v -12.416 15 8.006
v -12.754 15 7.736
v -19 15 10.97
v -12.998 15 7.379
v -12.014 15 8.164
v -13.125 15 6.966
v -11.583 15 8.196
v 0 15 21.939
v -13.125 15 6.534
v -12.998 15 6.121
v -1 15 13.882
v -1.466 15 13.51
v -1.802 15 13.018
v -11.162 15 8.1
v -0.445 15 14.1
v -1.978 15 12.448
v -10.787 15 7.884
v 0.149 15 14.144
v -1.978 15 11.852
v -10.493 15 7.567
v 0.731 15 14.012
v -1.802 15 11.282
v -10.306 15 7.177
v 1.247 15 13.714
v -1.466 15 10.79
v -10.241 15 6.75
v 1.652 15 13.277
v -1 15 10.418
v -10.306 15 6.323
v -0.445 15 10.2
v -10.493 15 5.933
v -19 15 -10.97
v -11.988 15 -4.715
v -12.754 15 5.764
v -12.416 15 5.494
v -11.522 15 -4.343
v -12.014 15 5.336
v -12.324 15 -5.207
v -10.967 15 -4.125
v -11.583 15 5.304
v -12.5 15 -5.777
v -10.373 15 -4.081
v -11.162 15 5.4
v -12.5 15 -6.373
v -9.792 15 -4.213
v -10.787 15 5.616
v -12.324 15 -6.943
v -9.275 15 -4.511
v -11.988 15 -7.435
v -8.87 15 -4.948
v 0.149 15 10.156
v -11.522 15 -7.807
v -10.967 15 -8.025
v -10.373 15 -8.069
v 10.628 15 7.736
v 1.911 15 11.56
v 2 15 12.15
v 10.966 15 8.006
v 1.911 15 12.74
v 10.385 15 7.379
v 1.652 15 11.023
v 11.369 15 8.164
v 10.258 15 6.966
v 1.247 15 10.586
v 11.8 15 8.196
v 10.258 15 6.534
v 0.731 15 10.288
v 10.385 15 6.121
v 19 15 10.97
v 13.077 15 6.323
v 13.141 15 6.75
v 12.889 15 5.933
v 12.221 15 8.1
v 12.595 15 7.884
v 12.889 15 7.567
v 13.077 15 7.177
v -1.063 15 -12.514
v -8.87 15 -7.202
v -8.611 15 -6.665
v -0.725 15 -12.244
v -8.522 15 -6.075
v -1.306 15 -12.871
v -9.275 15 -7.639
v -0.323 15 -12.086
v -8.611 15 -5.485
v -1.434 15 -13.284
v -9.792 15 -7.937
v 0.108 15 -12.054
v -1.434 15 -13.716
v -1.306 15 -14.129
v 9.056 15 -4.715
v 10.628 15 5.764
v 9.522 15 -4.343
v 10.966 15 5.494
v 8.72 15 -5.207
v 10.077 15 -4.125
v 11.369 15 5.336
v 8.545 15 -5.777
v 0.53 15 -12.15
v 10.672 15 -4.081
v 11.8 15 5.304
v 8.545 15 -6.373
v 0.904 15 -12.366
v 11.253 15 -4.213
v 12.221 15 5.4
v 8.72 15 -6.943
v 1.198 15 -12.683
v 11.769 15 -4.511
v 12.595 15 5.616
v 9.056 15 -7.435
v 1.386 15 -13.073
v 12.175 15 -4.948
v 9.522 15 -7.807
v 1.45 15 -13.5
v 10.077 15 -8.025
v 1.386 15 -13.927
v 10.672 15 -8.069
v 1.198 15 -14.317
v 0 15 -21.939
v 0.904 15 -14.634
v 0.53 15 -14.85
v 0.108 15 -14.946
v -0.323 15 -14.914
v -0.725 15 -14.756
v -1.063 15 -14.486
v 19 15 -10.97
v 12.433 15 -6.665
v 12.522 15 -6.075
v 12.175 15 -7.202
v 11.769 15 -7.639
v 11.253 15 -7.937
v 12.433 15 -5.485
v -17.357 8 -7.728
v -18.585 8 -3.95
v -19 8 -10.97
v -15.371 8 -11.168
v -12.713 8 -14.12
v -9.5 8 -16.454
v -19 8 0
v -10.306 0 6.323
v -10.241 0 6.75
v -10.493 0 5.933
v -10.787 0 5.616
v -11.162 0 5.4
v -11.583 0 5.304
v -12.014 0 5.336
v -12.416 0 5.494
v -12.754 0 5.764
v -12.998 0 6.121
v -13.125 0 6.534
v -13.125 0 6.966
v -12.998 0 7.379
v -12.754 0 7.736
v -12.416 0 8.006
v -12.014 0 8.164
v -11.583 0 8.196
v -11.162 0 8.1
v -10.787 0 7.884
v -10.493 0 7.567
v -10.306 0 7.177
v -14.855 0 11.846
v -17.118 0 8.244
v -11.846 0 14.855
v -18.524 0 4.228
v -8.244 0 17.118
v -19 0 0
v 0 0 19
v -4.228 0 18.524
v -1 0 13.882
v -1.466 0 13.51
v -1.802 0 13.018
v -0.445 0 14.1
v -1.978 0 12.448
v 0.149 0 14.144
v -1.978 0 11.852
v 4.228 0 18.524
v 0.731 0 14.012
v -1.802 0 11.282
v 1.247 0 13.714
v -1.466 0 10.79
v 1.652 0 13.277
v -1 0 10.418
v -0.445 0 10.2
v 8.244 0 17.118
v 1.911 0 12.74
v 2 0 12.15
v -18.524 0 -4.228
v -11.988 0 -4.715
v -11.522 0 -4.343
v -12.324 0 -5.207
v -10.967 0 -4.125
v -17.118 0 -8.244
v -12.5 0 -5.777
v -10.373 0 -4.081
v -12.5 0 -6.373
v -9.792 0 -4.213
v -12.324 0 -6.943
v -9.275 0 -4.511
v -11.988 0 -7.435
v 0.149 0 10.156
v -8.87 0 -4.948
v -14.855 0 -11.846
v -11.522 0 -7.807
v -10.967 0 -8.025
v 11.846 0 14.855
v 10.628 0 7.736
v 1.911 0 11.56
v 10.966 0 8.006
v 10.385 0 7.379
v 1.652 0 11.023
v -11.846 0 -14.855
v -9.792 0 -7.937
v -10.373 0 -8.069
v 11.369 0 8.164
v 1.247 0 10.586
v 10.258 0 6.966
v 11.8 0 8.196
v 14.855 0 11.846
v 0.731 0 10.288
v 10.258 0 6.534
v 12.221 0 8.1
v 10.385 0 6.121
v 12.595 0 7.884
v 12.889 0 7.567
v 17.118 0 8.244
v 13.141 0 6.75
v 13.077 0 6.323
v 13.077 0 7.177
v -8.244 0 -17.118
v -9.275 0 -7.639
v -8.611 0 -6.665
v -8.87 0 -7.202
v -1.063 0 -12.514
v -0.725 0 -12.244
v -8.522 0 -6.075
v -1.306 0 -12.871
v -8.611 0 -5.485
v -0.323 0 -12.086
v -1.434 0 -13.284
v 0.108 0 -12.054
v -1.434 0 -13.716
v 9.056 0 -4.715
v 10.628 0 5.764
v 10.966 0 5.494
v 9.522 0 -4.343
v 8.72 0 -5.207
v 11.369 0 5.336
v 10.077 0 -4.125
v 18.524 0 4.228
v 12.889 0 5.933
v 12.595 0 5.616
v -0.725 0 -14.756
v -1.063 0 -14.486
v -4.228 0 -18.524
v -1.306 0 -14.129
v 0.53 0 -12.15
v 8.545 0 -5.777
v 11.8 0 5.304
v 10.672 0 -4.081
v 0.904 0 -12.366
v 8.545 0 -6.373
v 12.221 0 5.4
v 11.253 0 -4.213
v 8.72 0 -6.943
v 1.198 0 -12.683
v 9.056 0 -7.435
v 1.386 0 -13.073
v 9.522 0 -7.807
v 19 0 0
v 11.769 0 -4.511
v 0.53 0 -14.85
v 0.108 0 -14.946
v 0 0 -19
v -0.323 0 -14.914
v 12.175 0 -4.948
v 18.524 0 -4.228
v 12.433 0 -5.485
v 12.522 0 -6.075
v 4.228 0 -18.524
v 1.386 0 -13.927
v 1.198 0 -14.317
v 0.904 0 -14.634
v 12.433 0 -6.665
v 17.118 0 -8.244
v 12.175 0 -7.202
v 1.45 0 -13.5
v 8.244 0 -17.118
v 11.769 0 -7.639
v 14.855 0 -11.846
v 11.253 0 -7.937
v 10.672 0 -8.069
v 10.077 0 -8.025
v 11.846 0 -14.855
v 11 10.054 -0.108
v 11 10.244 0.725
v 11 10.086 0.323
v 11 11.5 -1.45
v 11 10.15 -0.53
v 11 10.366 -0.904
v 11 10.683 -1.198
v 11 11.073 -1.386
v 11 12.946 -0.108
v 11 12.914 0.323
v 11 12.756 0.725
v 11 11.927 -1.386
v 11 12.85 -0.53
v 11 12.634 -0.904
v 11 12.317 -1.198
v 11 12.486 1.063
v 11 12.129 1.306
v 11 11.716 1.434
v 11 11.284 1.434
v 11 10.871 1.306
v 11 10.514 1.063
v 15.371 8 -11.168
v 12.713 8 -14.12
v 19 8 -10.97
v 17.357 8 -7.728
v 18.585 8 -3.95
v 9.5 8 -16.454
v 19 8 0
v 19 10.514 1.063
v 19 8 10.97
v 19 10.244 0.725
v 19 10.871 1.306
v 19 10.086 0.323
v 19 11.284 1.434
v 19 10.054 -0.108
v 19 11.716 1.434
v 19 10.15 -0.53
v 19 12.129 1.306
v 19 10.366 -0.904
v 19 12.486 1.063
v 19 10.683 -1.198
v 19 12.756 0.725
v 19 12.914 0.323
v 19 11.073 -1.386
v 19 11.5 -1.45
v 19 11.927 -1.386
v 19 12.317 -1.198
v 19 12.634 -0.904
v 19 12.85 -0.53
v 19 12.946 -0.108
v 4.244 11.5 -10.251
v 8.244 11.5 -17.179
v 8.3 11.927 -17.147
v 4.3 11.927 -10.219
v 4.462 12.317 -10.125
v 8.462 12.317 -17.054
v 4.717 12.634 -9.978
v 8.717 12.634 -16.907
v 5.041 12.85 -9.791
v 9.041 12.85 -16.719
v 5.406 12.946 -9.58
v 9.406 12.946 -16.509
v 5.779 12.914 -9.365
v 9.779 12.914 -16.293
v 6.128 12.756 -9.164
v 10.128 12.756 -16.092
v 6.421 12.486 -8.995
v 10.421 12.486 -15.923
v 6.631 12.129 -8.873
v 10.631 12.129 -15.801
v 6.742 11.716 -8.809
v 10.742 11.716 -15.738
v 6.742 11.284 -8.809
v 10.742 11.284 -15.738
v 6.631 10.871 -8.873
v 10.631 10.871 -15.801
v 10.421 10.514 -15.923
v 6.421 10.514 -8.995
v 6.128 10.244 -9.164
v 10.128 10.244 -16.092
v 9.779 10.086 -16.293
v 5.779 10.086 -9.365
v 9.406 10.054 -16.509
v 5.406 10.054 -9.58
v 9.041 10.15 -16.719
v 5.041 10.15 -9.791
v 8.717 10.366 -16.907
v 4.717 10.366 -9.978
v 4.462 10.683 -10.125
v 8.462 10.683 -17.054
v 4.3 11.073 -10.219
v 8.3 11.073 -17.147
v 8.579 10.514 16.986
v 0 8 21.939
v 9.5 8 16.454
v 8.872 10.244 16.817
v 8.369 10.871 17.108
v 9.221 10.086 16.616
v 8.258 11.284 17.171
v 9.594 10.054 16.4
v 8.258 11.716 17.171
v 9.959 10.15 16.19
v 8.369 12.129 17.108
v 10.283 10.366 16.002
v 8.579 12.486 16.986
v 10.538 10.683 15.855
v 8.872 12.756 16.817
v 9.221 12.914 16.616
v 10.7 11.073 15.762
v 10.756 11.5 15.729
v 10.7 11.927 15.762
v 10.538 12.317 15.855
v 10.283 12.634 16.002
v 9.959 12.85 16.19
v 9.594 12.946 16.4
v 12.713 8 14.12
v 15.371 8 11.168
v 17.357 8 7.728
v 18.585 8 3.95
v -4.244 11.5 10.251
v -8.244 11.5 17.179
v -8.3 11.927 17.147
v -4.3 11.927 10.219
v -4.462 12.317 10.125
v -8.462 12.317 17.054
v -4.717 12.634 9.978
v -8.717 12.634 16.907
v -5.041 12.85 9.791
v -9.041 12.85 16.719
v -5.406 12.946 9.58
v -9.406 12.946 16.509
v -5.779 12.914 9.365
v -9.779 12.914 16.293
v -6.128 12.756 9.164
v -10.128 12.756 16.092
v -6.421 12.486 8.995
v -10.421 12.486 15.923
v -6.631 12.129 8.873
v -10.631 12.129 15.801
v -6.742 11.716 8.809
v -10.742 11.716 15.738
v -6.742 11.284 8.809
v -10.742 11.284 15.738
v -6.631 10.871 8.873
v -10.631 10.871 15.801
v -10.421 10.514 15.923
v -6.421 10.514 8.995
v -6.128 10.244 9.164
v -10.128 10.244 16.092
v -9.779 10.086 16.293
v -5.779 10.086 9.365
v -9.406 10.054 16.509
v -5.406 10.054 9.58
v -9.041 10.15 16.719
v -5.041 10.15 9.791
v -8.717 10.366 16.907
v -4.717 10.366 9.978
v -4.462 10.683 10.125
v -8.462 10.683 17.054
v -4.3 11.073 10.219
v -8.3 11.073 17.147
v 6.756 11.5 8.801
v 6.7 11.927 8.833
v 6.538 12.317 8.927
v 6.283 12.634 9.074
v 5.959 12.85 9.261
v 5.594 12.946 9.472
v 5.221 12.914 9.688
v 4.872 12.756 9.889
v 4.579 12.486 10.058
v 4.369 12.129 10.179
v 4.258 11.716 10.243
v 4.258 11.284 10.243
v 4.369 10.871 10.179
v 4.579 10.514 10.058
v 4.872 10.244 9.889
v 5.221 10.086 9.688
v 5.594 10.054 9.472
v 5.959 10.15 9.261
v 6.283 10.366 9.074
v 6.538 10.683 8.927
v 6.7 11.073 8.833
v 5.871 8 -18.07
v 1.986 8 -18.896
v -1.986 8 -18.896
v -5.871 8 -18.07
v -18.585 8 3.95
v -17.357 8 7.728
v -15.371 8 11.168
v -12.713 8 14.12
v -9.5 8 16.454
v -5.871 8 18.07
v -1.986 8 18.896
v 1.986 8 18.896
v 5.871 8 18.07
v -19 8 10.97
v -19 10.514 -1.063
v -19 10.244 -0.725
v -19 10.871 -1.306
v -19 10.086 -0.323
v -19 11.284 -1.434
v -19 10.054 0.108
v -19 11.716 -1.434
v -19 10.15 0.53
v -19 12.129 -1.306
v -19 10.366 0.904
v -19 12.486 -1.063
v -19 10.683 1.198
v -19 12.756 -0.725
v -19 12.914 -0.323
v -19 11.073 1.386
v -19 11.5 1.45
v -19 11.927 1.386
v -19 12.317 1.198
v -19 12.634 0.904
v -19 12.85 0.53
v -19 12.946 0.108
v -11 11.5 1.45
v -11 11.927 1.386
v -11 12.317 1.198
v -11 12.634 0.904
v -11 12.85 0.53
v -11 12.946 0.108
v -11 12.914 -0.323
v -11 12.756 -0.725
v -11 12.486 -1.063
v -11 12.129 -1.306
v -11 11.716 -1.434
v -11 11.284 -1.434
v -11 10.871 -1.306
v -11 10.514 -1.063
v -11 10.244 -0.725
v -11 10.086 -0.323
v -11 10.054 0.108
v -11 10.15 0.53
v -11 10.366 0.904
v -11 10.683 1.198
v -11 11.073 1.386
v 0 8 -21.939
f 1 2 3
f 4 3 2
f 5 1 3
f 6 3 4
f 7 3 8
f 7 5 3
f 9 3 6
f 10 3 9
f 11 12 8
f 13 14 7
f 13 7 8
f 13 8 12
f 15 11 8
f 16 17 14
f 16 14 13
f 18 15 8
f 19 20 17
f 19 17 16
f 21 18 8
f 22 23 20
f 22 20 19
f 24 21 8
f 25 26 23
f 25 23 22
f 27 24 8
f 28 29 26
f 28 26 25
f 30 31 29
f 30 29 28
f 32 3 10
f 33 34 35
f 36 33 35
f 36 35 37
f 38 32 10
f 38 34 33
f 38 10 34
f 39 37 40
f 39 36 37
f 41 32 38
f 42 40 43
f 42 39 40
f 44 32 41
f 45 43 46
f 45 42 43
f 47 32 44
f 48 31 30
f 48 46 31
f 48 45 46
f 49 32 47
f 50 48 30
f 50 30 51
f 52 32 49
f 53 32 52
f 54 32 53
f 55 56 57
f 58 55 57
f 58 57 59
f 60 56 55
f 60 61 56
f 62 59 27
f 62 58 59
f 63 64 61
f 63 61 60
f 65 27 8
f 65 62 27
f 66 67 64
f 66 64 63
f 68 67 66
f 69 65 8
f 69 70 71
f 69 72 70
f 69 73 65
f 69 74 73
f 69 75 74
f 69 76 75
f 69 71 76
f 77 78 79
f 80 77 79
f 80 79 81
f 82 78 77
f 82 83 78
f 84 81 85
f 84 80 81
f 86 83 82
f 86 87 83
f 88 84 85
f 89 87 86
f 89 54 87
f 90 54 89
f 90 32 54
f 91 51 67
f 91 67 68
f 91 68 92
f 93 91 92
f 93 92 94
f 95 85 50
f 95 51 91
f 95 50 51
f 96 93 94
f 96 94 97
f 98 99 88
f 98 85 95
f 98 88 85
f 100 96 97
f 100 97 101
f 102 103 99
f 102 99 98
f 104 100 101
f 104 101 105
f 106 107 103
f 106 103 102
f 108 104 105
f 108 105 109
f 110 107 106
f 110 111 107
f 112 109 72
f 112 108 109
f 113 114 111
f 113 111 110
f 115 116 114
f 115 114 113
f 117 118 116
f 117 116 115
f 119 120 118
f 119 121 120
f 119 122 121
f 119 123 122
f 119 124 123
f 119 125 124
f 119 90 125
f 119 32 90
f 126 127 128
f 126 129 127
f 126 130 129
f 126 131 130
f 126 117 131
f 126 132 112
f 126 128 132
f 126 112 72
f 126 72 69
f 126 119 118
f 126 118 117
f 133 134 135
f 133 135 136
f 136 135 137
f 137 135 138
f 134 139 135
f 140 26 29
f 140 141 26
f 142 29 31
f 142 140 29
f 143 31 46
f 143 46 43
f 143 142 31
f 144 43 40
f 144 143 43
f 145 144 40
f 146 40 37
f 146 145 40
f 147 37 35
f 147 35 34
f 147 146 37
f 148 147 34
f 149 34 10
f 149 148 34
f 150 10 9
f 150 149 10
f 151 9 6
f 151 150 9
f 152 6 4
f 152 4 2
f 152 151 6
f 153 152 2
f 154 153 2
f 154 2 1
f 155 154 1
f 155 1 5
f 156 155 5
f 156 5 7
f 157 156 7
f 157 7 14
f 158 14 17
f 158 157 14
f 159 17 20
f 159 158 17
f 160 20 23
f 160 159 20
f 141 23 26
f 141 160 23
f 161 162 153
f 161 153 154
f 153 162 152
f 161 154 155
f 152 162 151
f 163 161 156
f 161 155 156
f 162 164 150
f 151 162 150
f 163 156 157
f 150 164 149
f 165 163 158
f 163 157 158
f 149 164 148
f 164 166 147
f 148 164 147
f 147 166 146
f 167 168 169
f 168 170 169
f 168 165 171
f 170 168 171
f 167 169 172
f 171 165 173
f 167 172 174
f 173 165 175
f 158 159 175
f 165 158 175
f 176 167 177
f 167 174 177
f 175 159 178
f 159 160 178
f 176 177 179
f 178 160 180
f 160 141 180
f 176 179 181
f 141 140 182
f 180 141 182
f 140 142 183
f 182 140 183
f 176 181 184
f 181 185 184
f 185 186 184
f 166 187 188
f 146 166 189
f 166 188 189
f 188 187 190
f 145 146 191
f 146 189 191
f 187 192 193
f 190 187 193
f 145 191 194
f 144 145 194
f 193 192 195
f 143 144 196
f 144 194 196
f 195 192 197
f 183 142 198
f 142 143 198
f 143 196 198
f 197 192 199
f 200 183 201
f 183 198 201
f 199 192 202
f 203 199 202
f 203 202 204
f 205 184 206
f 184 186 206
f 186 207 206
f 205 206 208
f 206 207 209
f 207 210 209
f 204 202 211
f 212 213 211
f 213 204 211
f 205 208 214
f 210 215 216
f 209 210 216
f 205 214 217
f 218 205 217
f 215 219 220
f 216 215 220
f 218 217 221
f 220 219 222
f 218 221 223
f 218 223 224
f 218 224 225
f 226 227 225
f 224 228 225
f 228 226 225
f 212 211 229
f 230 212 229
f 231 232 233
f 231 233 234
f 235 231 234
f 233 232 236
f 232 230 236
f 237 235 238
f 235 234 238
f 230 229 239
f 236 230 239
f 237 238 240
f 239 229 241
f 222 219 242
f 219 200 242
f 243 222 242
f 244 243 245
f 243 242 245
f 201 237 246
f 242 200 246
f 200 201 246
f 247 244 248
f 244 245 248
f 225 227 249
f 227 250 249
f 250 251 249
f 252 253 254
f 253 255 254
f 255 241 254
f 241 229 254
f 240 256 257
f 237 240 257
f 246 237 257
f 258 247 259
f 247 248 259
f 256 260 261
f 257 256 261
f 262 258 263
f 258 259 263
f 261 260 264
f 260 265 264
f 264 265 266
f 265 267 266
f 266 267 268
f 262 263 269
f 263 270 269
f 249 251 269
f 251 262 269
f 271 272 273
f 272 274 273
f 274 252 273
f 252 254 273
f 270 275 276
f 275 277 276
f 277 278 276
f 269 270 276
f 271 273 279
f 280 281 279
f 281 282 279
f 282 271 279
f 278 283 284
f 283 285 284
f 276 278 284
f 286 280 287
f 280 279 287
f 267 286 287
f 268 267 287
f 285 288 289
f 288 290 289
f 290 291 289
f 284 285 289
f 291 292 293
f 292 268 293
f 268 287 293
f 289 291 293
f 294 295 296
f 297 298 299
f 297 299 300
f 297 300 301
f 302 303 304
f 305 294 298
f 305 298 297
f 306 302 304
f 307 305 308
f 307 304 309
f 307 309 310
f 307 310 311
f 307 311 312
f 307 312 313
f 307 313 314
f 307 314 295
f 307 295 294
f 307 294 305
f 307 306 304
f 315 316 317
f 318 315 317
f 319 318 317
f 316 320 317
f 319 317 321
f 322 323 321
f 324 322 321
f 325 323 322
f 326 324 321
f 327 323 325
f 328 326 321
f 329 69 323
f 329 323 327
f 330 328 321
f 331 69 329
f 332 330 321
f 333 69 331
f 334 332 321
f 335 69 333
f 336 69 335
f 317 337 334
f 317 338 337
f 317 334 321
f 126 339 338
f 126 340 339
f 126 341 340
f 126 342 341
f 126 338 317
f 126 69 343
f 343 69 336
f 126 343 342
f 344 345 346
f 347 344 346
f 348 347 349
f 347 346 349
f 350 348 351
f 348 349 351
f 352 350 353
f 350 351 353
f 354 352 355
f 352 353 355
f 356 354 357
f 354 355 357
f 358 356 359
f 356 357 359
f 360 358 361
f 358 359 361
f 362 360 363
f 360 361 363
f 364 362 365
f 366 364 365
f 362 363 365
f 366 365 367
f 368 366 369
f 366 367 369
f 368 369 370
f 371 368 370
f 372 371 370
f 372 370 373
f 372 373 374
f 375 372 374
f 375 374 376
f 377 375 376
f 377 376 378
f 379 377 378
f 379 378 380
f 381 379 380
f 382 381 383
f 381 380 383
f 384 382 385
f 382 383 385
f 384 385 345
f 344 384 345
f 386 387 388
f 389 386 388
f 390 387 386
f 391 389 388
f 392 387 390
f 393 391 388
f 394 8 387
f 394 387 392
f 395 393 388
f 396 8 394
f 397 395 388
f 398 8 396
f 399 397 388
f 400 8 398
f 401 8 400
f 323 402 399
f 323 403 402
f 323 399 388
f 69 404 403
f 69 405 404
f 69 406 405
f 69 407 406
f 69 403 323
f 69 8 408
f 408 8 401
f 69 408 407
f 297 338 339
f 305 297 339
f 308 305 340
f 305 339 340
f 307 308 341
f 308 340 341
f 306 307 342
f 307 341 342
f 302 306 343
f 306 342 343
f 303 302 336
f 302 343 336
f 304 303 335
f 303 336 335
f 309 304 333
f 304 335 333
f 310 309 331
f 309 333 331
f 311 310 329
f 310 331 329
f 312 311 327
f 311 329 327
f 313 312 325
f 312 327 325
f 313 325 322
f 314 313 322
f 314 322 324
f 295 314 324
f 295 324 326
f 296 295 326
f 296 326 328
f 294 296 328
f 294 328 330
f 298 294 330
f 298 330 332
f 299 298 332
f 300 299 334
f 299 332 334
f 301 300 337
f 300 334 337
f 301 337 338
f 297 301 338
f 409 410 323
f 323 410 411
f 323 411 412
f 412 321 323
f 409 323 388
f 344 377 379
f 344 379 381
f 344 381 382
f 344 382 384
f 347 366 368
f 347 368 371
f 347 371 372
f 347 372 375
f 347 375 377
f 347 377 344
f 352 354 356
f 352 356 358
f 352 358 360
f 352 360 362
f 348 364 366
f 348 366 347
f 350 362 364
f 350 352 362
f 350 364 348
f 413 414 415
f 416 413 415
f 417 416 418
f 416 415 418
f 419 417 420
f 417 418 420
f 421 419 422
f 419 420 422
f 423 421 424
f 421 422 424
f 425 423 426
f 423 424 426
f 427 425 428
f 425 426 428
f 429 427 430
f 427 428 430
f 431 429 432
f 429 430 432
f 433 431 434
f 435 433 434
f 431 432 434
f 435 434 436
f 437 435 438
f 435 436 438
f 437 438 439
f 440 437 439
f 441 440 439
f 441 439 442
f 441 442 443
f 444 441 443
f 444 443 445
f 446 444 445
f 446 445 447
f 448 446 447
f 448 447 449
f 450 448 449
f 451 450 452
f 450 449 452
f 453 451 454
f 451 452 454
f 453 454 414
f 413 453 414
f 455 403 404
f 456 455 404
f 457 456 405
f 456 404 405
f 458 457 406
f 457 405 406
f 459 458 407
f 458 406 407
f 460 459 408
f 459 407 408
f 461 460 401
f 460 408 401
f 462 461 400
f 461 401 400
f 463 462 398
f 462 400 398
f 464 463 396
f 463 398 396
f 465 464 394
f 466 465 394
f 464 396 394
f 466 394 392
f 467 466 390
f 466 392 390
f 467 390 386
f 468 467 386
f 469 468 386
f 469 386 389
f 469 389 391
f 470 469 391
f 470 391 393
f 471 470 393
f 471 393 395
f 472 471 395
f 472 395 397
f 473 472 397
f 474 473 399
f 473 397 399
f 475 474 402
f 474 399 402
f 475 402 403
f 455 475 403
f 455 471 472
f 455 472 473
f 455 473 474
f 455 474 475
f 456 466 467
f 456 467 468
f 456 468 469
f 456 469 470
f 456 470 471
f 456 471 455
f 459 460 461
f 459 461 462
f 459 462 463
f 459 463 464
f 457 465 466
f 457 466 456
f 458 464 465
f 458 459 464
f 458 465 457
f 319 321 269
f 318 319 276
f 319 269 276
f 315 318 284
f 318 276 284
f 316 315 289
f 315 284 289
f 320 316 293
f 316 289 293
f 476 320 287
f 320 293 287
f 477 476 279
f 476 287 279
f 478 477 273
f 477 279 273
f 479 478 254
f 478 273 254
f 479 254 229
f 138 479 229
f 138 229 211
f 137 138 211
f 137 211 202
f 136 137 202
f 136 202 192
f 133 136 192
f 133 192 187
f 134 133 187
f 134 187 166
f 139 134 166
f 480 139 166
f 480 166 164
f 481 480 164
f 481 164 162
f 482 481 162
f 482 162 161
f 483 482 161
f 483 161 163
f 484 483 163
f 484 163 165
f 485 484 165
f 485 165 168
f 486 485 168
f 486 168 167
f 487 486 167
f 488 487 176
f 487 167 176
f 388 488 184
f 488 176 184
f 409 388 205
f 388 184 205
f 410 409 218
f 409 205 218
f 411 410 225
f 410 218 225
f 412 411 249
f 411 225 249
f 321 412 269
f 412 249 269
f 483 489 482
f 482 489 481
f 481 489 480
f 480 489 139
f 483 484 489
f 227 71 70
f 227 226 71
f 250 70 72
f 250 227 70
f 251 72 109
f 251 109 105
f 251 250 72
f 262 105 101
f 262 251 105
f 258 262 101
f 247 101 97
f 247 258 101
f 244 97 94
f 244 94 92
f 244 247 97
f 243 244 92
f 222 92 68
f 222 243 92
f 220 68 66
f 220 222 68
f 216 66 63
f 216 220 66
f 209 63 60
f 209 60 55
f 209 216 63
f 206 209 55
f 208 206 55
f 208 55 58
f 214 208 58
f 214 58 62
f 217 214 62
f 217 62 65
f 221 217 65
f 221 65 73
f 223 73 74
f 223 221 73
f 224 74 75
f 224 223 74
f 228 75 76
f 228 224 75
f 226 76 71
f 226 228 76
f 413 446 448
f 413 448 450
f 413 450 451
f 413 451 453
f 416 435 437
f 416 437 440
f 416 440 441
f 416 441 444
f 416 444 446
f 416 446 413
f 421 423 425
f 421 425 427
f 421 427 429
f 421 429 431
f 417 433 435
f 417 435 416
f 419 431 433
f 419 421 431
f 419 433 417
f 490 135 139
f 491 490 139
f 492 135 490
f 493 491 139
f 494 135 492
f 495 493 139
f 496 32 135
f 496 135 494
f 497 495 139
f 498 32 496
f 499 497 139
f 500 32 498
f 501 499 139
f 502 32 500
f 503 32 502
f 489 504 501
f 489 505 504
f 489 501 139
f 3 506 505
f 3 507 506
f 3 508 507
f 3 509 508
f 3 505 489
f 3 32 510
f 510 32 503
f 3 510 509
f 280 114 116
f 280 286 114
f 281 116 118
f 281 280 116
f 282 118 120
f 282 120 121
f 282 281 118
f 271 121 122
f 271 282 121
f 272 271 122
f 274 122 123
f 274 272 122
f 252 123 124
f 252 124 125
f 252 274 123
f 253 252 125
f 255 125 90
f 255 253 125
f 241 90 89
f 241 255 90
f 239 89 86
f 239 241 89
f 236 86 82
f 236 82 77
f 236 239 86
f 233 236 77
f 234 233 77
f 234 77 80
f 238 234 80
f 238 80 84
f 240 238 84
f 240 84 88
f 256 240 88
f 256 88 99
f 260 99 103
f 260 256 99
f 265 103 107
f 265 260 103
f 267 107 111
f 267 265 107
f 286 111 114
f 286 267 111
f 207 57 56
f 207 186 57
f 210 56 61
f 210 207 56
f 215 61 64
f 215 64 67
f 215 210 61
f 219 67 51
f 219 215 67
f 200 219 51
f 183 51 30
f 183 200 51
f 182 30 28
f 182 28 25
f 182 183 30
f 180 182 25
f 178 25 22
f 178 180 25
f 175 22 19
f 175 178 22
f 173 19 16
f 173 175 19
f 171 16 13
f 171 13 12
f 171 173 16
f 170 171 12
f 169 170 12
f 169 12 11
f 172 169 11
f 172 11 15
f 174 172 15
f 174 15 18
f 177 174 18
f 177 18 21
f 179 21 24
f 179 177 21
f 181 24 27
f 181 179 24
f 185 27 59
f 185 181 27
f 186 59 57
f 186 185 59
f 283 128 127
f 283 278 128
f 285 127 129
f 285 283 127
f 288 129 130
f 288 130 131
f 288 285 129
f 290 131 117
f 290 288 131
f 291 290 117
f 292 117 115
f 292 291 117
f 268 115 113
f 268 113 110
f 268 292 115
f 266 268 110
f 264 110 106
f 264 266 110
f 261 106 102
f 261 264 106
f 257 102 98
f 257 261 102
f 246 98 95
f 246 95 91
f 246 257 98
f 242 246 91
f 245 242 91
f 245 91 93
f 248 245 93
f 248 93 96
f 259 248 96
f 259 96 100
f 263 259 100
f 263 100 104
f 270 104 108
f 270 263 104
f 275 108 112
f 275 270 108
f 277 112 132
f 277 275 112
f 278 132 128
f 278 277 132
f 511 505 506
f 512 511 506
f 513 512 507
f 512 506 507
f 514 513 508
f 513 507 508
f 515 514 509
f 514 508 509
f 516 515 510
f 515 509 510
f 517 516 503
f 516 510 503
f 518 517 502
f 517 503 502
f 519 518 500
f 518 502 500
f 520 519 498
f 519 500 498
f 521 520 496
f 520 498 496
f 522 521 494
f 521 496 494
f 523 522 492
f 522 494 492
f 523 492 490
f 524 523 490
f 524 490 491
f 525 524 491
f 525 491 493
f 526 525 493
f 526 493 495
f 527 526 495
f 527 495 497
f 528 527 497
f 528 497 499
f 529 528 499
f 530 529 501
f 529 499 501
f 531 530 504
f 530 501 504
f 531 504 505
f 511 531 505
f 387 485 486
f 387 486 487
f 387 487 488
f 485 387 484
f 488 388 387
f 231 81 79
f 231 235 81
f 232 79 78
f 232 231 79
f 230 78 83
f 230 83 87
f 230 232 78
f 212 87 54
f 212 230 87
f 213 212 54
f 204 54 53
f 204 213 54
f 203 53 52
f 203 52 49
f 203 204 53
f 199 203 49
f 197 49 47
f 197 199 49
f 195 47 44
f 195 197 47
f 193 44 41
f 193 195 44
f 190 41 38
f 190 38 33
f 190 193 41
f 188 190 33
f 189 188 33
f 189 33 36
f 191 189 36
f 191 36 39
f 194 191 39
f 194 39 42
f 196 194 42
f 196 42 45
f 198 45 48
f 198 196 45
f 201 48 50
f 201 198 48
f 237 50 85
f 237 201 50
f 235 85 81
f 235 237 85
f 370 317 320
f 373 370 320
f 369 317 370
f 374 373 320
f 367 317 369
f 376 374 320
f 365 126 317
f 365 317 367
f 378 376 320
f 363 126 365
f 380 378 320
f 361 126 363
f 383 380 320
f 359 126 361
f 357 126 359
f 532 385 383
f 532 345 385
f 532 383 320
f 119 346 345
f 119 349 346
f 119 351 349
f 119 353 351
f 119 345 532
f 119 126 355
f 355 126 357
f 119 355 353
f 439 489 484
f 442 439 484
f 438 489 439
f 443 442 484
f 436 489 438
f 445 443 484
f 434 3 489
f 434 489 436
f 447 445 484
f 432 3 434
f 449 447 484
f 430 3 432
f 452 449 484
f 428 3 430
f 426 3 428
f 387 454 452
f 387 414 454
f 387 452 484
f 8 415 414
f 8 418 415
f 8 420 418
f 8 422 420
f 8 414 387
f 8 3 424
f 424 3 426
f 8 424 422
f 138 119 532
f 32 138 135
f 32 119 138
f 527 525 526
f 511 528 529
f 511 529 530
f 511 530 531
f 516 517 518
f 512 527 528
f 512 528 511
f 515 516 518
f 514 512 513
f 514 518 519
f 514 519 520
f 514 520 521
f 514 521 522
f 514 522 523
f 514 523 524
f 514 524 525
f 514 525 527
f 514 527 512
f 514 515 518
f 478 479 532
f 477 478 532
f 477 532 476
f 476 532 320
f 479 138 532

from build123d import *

# Parameters (mm, degrees)
SKETCH_1_R          = 19
SKETCH_1_R_2        = 1.45
SKETCH_1_R_3        = 2
EXTRUDE_1_DEPTH     = 15
SKETCH_2_R          = 1.45
SKETCH_2_R_2        = 2
EXTRUDE_2_DEPTH     = 7
SKETCH_3_R          = 1.45
CUT_EXTRUDE_1_DEPTH = 8
SKETCH_4_R          = 1.45
CUT_EXTRUDE_2_DEPTH = 8
SKETCH_5_R          = 1.45
CUT_EXTRUDE_3_DEPTH = 8
SKETCH_6_R          = 1.45
CUT_EXTRUDE_4_DEPTH = 8
SKETCH_7_R          = 1.45
CUT_EXTRUDE_5_DEPTH = 8


with BuildPart() as part:
    # 草图1 → 凸台-拉伸1 (new body)
    with BuildSketch(Plane(origin=(0, 0, 0), x_dir=(1, 0, 0), z_dir=(0, 1, 0))):
        Circle(SKETCH_1_R)
        with Locations((0, 13.5)):
            Circle(SKETCH_1_R_2, mode=Mode.SUBTRACT)
        with Locations((-11.691342951, -6.75)):
            Circle(SKETCH_1_R_2, mode=Mode.SUBTRACT)
        with Locations((11.691342951, -6.75)):
            Circle(SKETCH_1_R_2, mode=Mode.SUBTRACT)
        with Locations((-10.522208656, 6.075)):
            Circle(SKETCH_1_R_3, mode=Mode.SUBTRACT)
        with Locations((0, -12.15)):
            Circle(SKETCH_1_R_3, mode=Mode.SUBTRACT)
        with Locations((10.522208656, 6.075)):
            Circle(SKETCH_1_R_3, mode=Mode.SUBTRACT)
    extrude(amount=EXTRUDE_1_DEPTH)

    # 草图2 → 凸台-拉伸2 (add)
    with BuildSketch(Plane(origin=(0, 15, 0), x_dir=(1, 0, 0), z_dir=(0, 1, 0))):
        Polygon((0, 21.939310229), (-19, 10.969655115), (-19, -10.969655115), (0, -21.939310229), (19, -10.969655115), (19, 10.969655115), align=None)
        with Locations((0, 13.5)):
            Circle(SKETCH_2_R, mode=Mode.SUBTRACT)
        with Locations((-10.522208656, 6.075)):
            Circle(SKETCH_2_R_2, mode=Mode.SUBTRACT)
        with Locations((10.522208656, 6.075)):
            Circle(SKETCH_2_R_2, mode=Mode.SUBTRACT)
        with Locations((-11.691342951, -6.75)):
            Circle(SKETCH_2_R, mode=Mode.SUBTRACT)
        with Locations((0, -12.15)):
            Circle(SKETCH_2_R_2, mode=Mode.SUBTRACT)
        with Locations((11.691342951, -6.75)):
            Circle(SKETCH_2_R, mode=Mode.SUBTRACT)
    extrude(amount=-EXTRUDE_2_DEPTH)

    # 草图3 → 切除-拉伸1 (cut)
    with BuildSketch(Plane(origin=(9.5, 0, 16.454482672), x_dir=(0.866025404, 0, -0.5), z_dir=(0.5, 0, 0.866025404))):
        with Locations((0, 11.5)):
            Circle(SKETCH_3_R)
    extrude(amount=-CUT_EXTRUDE_1_DEPTH, mode=Mode.SUBTRACT)

    # 草图4 → 切除-拉伸2 (cut)
    with BuildSketch(Plane(origin=(-9.5, 0, 16.454482672), x_dir=(0.866025404, 0, 0.5), z_dir=(-0.5, 0, 0.866025404))):
        with Locations((0, 11.5)):
            Circle(SKETCH_4_R)
    extrude(amount=-CUT_EXTRUDE_2_DEPTH, mode=Mode.SUBTRACT)

    # 草图5 → 切除-拉伸3 (cut)
    with BuildSketch(Plane.ZY.offset(19)):
        with Locations((0, 11.5)):
            Circle(SKETCH_5_R)
    extrude(amount=-CUT_EXTRUDE_3_DEPTH, mode=Mode.SUBTRACT)

    # 草图6 → 切除-拉伸4 (cut)
    with BuildSketch(Plane(origin=(19, 0, 0), x_dir=(0, 0, -1), z_dir=(1, 0, 0))):
        with Locations((0, 11.5)):
            Circle(SKETCH_6_R)
    extrude(amount=-CUT_EXTRUDE_4_DEPTH, mode=Mode.SUBTRACT)

    # 草图7 → 切除-拉伸5 (cut)
    with BuildSketch(Plane(origin=(9.5, 0, -16.454482672), x_dir=(-0.866025404, 0, -0.5), z_dir=(0.5, 0, -0.866025404))):
        with Locations((0, 11.5)):
            Circle(SKETCH_7_R)
    extrude(amount=-CUT_EXTRUDE_5_DEPTH, mode=Mode.SUBTRACT)


solid = part.part
